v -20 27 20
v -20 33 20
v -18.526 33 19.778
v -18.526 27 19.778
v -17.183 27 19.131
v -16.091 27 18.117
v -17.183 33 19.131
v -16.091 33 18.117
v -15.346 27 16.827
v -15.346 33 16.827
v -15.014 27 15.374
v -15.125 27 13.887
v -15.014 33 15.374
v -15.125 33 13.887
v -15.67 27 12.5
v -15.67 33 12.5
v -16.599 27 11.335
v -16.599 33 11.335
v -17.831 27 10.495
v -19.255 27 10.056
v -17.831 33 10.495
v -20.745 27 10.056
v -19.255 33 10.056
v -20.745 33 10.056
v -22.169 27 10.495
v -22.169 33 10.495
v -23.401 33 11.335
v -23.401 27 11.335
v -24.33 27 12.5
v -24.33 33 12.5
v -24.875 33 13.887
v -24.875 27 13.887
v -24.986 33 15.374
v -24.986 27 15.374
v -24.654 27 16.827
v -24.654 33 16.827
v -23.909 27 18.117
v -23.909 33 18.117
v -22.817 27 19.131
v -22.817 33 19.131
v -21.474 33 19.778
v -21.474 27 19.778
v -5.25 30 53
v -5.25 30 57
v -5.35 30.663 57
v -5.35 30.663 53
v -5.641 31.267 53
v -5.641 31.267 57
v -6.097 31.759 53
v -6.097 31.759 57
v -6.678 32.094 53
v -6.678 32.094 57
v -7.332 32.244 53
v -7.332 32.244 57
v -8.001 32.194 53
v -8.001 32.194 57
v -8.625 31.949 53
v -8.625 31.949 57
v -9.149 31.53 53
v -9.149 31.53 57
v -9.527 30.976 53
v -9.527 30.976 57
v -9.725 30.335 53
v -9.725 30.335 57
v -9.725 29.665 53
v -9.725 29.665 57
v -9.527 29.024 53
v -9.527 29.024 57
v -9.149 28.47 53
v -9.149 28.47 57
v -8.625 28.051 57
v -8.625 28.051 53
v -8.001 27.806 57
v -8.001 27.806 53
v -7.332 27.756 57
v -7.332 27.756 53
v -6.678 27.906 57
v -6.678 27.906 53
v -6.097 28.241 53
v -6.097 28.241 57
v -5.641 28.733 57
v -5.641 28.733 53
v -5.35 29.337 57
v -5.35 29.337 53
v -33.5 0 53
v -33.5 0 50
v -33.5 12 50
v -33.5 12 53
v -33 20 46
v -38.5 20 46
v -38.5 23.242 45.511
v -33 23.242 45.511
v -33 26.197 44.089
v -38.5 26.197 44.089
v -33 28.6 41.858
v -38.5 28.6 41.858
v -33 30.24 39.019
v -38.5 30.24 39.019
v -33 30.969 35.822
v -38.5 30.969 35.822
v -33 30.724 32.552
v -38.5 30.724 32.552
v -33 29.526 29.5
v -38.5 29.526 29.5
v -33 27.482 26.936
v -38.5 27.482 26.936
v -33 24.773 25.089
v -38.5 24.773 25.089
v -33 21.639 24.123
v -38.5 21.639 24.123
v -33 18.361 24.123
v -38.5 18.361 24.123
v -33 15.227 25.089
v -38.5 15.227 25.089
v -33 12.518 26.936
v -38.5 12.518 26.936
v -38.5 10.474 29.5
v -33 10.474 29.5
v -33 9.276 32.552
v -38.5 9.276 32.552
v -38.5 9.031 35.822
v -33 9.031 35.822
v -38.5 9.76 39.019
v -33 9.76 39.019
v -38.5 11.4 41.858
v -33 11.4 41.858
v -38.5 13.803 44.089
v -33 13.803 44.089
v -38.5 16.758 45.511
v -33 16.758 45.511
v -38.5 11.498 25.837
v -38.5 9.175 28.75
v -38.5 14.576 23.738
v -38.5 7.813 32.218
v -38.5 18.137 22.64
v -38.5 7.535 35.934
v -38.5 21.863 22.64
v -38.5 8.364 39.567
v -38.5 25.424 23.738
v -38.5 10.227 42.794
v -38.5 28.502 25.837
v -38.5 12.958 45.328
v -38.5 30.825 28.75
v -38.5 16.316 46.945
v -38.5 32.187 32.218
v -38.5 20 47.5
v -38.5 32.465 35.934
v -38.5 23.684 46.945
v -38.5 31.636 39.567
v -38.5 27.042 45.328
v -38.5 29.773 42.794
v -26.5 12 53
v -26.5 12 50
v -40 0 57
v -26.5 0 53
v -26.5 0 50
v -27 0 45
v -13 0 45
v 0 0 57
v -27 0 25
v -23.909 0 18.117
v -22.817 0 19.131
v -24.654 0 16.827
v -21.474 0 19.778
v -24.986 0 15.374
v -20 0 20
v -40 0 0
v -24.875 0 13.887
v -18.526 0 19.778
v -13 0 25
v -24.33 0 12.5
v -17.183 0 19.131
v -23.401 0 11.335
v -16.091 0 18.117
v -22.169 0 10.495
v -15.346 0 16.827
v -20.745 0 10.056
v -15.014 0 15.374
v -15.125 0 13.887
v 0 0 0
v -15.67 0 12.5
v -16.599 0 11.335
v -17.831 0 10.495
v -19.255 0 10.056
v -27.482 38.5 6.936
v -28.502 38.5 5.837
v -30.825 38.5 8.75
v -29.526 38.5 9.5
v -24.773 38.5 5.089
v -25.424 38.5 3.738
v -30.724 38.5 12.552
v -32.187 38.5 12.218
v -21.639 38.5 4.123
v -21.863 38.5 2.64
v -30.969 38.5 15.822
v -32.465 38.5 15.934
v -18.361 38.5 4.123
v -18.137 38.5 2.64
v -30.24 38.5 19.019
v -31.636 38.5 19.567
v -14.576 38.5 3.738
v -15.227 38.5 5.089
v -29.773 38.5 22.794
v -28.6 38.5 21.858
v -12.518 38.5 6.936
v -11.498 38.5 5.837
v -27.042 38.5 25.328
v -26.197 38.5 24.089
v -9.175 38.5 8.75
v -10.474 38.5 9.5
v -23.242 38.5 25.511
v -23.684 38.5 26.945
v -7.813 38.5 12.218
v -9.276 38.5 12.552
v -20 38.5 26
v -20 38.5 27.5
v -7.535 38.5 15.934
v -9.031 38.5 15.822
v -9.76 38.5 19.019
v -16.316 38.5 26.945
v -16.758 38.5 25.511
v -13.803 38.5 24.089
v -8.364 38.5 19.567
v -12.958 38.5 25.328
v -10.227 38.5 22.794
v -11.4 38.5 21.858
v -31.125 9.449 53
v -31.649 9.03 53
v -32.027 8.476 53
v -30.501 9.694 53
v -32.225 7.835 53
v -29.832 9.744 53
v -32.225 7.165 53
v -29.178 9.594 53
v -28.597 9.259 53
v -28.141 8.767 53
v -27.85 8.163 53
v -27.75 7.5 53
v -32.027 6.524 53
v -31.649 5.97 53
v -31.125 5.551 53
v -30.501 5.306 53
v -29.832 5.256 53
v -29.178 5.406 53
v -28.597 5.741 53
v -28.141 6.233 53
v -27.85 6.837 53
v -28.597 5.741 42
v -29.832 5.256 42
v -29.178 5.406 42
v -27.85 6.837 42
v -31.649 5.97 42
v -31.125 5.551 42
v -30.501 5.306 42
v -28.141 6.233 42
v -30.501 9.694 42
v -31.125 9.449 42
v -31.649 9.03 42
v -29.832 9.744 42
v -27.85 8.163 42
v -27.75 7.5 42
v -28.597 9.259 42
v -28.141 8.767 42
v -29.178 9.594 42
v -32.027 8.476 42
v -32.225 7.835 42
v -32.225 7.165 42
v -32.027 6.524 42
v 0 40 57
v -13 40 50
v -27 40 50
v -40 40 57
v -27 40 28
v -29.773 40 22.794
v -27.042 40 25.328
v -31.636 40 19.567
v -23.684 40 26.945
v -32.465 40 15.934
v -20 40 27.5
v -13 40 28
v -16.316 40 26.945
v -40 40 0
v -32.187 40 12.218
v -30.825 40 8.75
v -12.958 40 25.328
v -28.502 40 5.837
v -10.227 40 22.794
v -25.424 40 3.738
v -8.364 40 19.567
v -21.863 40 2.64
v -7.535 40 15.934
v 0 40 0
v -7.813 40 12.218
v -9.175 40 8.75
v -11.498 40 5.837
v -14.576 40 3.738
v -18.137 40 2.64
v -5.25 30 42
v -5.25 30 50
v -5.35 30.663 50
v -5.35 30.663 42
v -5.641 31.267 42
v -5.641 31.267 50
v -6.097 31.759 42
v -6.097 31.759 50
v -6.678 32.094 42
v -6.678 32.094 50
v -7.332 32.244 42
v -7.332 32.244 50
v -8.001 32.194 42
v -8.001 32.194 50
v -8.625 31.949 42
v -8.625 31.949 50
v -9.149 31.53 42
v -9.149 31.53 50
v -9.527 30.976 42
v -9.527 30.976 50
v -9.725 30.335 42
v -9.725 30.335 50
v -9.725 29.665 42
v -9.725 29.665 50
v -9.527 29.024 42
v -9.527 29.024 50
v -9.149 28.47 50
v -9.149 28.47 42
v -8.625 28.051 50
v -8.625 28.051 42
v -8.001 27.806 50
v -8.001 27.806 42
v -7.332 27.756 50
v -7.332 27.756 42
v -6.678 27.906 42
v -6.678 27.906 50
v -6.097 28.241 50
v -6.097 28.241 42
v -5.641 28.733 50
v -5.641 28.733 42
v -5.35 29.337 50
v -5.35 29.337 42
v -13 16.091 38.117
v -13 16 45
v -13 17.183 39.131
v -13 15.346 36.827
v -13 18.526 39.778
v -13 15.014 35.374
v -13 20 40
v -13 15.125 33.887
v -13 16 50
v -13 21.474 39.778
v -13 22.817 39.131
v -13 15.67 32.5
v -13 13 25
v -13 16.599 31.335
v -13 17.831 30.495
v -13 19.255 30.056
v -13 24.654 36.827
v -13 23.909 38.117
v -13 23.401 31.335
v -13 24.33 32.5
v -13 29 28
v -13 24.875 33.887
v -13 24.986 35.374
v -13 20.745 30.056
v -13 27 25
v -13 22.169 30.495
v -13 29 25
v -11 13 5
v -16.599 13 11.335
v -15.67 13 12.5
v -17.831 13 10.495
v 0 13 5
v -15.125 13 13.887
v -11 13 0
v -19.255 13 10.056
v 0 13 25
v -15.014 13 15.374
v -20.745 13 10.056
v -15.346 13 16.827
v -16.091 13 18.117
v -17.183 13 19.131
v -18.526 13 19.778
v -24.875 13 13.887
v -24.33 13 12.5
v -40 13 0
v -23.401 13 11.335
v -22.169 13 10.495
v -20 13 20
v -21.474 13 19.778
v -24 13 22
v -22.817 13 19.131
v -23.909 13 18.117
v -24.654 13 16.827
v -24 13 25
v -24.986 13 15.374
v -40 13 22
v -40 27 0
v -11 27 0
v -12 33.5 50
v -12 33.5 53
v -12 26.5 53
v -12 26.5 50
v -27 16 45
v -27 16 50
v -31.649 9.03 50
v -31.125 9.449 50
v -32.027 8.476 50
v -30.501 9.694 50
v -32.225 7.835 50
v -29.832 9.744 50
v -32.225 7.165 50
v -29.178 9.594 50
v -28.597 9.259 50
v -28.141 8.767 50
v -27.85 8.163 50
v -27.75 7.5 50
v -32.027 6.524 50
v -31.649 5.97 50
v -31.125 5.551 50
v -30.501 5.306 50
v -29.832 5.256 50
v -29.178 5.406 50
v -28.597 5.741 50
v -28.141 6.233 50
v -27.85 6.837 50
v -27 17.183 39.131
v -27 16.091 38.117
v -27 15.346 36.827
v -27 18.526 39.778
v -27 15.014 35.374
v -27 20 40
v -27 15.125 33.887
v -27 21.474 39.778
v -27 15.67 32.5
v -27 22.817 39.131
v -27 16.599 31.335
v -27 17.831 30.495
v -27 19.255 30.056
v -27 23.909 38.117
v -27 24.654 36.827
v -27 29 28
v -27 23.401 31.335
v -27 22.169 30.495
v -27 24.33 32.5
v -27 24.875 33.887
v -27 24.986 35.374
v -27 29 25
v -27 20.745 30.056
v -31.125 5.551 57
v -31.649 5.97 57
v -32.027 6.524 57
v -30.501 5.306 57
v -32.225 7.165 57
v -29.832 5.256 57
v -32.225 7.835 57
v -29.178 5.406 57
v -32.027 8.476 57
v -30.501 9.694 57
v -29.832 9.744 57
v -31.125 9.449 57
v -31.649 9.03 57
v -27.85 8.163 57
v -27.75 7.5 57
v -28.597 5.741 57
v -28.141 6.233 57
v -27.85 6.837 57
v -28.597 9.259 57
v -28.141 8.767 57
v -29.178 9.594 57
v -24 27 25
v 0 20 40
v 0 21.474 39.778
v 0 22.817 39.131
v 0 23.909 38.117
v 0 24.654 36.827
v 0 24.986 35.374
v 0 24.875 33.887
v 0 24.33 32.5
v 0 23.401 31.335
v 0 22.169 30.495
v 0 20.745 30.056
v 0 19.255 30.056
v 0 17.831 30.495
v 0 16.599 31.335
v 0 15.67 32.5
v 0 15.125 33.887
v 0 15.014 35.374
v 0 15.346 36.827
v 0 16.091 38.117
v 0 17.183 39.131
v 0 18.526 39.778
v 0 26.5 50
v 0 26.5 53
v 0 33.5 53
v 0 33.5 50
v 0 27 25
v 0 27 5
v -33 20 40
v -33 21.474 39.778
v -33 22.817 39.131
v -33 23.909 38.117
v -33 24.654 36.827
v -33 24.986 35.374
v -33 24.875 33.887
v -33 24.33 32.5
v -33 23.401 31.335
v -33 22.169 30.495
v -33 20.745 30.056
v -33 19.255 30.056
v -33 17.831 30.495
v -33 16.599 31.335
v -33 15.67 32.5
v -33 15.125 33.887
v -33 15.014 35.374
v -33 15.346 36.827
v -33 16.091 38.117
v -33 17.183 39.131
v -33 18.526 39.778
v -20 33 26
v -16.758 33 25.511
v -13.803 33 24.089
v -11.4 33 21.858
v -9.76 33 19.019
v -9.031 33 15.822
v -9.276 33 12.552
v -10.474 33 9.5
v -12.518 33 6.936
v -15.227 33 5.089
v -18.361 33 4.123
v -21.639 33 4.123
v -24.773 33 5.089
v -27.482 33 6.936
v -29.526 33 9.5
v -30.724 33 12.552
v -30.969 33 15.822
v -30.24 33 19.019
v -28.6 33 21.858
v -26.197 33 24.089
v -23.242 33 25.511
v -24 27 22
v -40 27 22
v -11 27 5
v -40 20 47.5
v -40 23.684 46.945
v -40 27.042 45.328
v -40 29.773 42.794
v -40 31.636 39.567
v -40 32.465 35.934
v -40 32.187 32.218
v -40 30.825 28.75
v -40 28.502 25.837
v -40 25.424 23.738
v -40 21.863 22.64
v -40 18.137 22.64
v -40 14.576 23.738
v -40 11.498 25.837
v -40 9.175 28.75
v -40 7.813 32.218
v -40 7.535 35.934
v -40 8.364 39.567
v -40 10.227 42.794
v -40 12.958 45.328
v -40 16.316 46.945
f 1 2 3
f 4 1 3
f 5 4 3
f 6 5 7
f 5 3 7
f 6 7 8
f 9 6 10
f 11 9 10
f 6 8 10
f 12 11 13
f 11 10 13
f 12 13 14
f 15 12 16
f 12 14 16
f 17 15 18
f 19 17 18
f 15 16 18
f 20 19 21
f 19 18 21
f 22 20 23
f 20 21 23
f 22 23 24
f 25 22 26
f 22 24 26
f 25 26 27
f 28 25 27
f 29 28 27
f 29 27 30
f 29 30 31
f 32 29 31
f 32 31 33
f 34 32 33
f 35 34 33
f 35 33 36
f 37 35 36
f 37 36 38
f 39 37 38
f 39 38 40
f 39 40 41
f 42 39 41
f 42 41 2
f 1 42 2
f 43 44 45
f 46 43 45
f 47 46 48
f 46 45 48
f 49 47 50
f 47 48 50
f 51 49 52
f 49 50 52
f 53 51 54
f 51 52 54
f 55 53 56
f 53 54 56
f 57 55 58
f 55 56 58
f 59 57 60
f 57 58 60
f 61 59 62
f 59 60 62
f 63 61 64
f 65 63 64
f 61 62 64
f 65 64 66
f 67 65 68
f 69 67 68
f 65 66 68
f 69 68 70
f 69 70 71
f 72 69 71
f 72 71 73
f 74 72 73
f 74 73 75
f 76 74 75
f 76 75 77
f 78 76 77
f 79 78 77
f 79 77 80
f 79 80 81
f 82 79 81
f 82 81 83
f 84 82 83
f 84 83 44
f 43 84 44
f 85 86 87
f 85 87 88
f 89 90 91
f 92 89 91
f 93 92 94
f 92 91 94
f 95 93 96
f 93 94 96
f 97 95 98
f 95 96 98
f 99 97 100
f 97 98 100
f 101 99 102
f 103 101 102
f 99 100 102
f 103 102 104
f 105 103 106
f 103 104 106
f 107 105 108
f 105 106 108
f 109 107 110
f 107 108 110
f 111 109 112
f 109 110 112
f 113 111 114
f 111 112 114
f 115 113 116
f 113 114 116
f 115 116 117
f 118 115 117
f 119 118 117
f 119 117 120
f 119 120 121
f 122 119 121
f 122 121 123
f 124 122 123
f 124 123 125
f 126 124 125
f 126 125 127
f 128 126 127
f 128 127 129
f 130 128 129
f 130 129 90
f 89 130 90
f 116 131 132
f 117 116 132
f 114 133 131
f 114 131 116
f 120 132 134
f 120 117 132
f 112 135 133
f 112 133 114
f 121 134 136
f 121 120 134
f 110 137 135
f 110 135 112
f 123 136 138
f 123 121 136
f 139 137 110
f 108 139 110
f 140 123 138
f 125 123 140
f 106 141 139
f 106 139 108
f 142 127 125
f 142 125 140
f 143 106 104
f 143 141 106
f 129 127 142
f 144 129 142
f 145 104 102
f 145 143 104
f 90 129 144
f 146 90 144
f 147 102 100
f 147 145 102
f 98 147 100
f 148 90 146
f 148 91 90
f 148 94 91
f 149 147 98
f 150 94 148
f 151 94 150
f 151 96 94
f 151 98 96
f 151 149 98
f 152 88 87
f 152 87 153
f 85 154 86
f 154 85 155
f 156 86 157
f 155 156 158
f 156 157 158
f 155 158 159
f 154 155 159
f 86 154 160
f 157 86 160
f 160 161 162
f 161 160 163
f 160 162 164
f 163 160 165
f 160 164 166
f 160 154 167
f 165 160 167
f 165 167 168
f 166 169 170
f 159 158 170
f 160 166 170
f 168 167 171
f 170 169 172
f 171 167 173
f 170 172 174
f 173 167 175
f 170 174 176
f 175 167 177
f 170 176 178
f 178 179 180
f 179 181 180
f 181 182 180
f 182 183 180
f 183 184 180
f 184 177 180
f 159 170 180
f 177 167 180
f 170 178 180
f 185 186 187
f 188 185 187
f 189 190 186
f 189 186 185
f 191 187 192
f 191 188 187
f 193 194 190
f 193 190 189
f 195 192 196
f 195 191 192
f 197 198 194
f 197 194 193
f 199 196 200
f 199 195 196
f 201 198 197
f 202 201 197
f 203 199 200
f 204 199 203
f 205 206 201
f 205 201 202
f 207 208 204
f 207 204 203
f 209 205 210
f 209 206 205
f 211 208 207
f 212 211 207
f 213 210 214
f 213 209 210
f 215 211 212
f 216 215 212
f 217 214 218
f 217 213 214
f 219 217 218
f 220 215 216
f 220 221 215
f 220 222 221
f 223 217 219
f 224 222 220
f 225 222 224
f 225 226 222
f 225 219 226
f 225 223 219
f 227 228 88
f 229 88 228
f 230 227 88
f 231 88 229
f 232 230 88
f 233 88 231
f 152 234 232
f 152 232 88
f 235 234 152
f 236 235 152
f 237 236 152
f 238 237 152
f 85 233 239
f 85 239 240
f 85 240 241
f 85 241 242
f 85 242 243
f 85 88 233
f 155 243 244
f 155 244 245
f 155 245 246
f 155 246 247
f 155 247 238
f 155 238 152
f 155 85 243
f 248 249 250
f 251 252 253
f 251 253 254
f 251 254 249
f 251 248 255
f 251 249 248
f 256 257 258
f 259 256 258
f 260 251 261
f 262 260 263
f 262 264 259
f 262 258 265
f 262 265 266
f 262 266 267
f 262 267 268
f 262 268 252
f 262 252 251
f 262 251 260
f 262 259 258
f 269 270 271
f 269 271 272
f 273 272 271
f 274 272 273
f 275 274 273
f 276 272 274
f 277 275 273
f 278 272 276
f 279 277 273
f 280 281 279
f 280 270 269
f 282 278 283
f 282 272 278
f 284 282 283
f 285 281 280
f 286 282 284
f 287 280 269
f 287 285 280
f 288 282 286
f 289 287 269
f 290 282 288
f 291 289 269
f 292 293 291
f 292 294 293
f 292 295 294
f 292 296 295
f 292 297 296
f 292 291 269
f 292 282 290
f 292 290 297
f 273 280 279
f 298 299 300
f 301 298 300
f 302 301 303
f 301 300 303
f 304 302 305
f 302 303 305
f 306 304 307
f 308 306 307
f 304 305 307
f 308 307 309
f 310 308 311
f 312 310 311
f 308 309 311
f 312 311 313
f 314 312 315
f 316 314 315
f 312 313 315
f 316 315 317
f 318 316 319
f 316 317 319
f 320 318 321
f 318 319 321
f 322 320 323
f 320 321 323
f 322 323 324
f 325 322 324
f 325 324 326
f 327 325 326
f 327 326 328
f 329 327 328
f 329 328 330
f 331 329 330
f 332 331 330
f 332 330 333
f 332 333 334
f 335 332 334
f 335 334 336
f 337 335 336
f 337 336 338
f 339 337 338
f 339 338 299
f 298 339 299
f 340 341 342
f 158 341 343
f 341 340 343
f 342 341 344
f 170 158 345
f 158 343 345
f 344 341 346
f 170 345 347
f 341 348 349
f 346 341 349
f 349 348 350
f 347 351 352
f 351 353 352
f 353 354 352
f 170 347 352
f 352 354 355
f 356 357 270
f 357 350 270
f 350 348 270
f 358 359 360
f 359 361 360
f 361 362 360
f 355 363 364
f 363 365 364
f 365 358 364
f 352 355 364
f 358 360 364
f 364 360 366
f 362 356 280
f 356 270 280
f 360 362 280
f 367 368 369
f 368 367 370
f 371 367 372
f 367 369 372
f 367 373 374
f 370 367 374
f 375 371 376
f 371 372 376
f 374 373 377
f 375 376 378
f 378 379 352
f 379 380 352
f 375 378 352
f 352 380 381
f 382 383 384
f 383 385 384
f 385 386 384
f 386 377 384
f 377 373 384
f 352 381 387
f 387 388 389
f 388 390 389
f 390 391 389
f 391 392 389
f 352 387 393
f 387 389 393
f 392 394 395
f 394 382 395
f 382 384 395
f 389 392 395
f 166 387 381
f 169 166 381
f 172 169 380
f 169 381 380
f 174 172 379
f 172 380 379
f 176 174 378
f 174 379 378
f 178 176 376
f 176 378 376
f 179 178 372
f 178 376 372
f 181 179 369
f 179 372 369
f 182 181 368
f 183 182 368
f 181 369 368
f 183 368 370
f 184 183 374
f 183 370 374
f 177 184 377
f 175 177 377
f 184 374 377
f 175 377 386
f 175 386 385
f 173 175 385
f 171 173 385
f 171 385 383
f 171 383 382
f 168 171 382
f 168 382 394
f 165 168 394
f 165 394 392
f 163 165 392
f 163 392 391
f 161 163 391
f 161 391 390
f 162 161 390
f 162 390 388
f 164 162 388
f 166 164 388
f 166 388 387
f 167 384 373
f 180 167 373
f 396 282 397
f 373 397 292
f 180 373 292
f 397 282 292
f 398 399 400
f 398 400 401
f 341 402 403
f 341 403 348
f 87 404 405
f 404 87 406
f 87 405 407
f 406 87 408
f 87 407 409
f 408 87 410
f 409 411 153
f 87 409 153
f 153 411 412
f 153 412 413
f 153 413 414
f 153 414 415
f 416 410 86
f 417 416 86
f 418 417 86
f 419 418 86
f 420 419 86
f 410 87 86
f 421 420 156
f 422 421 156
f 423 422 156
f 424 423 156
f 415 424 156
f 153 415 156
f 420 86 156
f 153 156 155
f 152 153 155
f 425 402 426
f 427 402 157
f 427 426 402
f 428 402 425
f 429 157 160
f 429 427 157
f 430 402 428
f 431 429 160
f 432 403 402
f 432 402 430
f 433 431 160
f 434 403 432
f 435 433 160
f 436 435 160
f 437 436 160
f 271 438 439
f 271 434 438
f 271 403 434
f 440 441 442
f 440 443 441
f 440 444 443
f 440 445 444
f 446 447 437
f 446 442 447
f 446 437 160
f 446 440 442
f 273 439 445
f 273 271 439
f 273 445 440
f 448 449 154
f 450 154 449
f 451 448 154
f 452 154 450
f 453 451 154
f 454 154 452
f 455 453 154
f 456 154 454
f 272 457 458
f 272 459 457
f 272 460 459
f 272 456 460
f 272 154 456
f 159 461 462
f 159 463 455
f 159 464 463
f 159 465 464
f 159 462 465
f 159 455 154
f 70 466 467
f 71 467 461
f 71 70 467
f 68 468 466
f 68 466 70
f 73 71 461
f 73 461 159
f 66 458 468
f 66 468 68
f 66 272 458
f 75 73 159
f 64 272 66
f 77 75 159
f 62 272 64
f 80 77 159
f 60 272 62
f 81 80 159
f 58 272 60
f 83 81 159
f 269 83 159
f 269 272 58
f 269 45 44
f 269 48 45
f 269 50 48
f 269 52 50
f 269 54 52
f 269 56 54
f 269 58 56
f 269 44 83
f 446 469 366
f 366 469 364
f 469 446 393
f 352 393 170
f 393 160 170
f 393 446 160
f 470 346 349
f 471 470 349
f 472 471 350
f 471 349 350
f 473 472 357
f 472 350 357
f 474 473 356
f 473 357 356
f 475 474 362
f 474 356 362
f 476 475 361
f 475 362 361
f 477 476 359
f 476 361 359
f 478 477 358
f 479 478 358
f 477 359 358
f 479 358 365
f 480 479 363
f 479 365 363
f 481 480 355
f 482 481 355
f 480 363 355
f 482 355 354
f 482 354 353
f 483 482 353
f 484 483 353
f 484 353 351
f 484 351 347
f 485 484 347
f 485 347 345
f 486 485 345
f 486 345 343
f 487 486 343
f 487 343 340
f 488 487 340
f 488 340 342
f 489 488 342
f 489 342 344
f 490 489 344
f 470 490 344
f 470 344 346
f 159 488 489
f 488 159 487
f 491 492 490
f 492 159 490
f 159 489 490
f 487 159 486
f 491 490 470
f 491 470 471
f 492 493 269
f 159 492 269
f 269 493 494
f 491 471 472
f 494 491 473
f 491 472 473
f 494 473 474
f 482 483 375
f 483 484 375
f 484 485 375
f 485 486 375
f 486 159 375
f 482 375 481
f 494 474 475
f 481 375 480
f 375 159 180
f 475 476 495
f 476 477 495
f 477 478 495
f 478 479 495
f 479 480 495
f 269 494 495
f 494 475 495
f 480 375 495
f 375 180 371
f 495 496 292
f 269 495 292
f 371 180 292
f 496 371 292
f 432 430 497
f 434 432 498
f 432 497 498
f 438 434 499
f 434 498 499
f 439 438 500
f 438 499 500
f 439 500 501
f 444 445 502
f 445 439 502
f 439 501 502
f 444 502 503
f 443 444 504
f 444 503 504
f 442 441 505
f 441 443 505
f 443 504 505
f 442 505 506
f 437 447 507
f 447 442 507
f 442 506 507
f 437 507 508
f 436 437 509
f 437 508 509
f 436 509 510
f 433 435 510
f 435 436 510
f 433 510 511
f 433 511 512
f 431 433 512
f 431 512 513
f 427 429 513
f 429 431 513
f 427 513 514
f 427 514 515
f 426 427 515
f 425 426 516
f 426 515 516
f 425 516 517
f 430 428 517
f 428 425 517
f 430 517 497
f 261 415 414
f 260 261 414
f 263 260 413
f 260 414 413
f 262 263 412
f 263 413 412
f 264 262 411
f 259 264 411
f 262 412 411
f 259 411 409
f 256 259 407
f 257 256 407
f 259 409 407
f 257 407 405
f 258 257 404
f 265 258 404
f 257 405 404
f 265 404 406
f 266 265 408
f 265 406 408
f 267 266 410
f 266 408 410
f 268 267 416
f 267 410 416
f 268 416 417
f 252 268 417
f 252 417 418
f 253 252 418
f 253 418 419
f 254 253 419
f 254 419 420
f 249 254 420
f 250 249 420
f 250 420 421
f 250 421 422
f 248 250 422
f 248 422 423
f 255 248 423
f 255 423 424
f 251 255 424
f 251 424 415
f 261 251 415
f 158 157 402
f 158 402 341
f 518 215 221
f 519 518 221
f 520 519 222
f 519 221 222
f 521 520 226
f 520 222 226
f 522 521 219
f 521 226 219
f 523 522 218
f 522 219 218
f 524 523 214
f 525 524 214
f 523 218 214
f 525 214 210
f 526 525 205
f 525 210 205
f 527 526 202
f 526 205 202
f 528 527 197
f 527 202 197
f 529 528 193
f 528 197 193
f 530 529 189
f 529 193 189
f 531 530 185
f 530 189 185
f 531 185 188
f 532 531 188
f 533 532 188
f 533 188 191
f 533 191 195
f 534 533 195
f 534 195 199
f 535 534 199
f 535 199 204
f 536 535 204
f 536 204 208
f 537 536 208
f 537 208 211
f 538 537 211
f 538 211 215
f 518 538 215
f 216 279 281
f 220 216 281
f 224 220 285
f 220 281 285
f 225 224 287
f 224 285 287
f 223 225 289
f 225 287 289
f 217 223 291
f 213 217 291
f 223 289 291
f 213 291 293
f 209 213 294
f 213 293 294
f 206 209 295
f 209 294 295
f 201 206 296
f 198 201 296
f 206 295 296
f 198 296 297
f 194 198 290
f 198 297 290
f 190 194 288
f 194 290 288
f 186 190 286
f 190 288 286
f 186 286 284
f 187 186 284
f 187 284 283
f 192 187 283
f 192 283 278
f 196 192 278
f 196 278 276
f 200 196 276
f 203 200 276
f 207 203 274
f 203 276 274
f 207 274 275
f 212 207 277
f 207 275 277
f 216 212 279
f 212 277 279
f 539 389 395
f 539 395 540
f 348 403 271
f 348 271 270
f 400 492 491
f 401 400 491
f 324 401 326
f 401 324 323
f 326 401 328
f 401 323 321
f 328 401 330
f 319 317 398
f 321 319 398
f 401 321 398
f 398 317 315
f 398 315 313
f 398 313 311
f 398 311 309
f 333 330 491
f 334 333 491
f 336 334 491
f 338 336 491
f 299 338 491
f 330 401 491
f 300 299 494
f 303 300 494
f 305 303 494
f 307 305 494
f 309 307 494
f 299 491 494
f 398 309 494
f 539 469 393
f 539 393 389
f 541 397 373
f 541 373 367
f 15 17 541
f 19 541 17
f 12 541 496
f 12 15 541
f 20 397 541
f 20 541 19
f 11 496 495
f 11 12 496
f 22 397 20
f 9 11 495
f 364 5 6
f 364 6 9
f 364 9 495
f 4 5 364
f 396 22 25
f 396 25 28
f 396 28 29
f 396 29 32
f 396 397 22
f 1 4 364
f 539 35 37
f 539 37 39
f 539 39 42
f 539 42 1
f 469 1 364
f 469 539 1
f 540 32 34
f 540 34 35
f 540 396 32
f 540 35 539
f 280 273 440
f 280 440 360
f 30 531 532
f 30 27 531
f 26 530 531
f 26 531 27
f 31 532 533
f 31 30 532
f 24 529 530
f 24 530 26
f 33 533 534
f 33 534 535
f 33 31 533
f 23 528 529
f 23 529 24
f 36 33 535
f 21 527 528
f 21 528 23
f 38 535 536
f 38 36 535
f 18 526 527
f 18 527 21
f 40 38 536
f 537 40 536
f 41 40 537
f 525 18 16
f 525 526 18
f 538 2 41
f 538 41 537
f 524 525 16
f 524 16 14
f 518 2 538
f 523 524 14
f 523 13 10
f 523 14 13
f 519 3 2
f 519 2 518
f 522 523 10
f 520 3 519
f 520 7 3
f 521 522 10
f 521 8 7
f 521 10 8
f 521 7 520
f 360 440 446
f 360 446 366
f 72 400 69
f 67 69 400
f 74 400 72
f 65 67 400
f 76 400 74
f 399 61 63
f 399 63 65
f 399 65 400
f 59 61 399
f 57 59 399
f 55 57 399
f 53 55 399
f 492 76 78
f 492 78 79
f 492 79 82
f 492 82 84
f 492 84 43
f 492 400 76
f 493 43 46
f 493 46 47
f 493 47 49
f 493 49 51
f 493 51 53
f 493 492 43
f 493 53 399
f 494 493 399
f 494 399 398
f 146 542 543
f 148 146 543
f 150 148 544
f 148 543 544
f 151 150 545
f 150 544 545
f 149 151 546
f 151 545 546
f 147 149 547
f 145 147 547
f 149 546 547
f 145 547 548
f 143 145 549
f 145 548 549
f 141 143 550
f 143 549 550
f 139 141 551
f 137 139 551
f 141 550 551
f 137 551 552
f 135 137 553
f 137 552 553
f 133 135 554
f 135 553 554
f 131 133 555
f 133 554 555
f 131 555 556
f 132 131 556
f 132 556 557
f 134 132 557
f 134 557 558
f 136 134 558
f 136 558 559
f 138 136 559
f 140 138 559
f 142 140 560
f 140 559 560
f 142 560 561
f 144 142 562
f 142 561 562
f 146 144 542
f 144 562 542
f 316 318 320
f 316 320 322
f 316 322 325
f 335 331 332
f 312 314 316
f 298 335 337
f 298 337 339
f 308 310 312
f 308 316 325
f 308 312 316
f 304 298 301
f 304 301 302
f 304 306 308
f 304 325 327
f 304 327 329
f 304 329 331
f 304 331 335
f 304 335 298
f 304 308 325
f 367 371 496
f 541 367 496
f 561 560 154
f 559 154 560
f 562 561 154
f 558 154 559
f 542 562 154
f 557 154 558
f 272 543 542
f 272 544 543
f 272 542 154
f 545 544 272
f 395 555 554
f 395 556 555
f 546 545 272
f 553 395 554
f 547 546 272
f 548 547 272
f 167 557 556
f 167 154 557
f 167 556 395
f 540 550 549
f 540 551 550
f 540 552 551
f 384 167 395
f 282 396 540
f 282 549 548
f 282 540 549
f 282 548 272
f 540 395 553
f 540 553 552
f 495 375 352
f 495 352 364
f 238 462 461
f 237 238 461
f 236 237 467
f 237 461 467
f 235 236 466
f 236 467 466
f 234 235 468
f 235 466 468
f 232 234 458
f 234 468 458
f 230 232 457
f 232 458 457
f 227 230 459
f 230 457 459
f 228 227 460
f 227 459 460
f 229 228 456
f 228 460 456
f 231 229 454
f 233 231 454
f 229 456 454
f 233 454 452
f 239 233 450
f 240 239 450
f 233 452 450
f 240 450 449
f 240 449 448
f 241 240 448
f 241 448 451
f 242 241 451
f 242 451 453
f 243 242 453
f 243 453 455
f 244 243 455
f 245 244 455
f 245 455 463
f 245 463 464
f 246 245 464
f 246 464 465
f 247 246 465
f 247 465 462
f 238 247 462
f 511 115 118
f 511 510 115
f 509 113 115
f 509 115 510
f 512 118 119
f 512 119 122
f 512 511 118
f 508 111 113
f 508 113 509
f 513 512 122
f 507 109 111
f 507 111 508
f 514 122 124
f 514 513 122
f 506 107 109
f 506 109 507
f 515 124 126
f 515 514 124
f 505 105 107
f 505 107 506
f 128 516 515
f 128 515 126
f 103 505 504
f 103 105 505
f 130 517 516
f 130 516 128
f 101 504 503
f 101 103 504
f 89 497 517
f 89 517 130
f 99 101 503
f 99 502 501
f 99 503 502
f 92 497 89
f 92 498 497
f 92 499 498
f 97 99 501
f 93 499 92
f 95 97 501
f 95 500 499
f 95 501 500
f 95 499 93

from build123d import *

# Parameters (mm, degrees)
ESQUISSE1_W              = 40
ESQUISSE1_H              = 40
BOSS_EXTRU_1_DEPTH       = 50
ESQUISSE2_R              = 5
ENL_V_MAT_EXTRU_1_DEPTH  = 41
ESQUISSE3_R              = 5
ENL_V_MAT_EXTRU_2_DEPTH  = 41
ESQUISSE4_W              = 22
ESQUISSE4_H              = 14
ENL_V_MAT_EXTRU_3_DEPTH  = 29
ESQUISSE5_W              = 14
ESQUISSE5_H              = 20
ENL_V_MAT_EXTRU_4_DEPTH  = 29
ESQUISSE6_W              = 20
ESQUISSE6_H              = 14
ENL_V_MAT_EXTRU_5_DEPTH  = 24
ESQUISSE7_W              = 14
ESQUISSE7_H              = 22
ENL_V_MAT_EXTRU_6_DEPTH  = 24
ESQUISSE10_R             = 11
ENL_V_MAT_EXTRU_9_DEPTH  = 7
ESQUISSE11_R             = 12.5
ENL_V_MAT_EXTRU_10_DEPTH = 1.5
ESQUISSE14_R             = 11
ENL_V_MAT_EXTRU_11_DEPTH = 7
ESQUISSE15_R             = 12.5
ENL_V_MAT_EXTRU_12_DEPTH = 1.5
ESQUISSE16_W             = 40
ESQUISSE16_H             = 40
BOSS_EXTRU_2_DEPTH       = 7
ESQUISSE17_R             = 2.25
ENL_V_MAT_EXTRU_13_DEPTH = 15
ESQUISSE18_W             = 7
ESQUISSE18_H             = 3
ENL_V_MAT_EXTRU_14_DEPTH = 12
ESQUISSE19_W             = 3
ESQUISSE19_H             = 7
ENL_V_MAT_EXTRU_15_DEPTH = 12


with BuildPart() as part:
    # Esquisse1 → Boss.-Extru.1 (new body)
    with BuildSketch(Plane.XY):
        with Locations((-20, 20)):
            Rectangle(ESQUISSE1_W, ESQUISSE1_H)
    extrude(amount=BOSS_EXTRU_1_DEPTH)

    # Esquisse2 → Enlèv. mat.-Extru.1 (cut, through all)
    with BuildSketch(Plane(origin=(0, 40, 0), x_dir=(1, 0, 0), z_dir=(0, 1, 0))):
        with Locations(Location((-20, -15, 0), (0, 0, 270))):  # turned: the seam where the file's is
            Circle(ESQUISSE2_R)
    extrude(amount=-ENL_V_MAT_EXTRU_1_DEPTH, mode=Mode.SUBTRACT)

    # Esquisse3 → Enlèv. mat.-Extru.2 (cut, through all)
    with BuildSketch(Plane.ZY.offset(40)):
        with Locations((35, 20)):
            Circle(ESQUISSE3_R)
    extrude(amount=-ENL_V_MAT_EXTRU_2_DEPTH, mode=Mode.SUBTRACT)

    # Esquisse4 → Enlèv. mat.-Extru.3 (cut)
    with BuildSketch(Plane.ZY.offset(40)):
        with Locations((11, 20)):
            Rectangle(ESQUISSE4_W, ESQUISSE4_H)
    extrude(amount=-ENL_V_MAT_EXTRU_3_DEPTH, mode=Mode.SUBTRACT)

    # Esquisse5 → Enlèv. mat.-Extru.4 (cut)
    with BuildSketch(Plane.XZ):
        with Locations((-20, 35)):
            Rectangle(ESQUISSE5_W, ESQUISSE5_H)
    extrude(amount=-ENL_V_MAT_EXTRU_4_DEPTH, mode=Mode.SUBTRACT)

    # Esquisse6 → Enlèv. mat.-Extru.5 (cut)
    with BuildSketch(Plane(origin=(0, 0, 0), x_dir=(0, 0, -1), z_dir=(1, 0, 0))):
        with Locations((-15, 20)):
            Rectangle(ESQUISSE6_W, ESQUISSE6_H)
    extrude(amount=-ENL_V_MAT_EXTRU_5_DEPTH, mode=Mode.SUBTRACT)

    # Esquisse7 → Enlèv. mat.-Extru.6 (cut)
    with BuildSketch(Plane(origin=(0, 40, 0), x_dir=(1, 0, 0), z_dir=(0, 1, 0))):
        with Locations((-20, -39)):
            Rectangle(ESQUISSE7_W, ESQUISSE7_H)
    extrude(amount=-ENL_V_MAT_EXTRU_6_DEPTH, mode=Mode.SUBTRACT)

    # Esquisse10 → Enlèv. mat.-Extru.9 (cut)
    with BuildSketch(Plane(origin=(0, 40, 0), x_dir=(1, 0, 0), z_dir=(0, 1, 0))):
        with Locations(Location((-20, -15, 0), (0, 0, 270))):  # turned: the seam where the file's is
            Circle(ESQUISSE10_R)
    extrude(amount=-ENL_V_MAT_EXTRU_9_DEPTH, mode=Mode.SUBTRACT)

    # Esquisse11 → Enlèv. mat.-Extru.10 (cut)
    with BuildSketch(Plane(origin=(0, 40, 0), x_dir=(1, 0, 0), z_dir=(0, 1, 0))):
        with Locations(Location((-20, -15, 0), (0, 0, 270))):  # turned: the seam where the file's is
            Circle(ESQUISSE11_R)
    extrude(amount=-ENL_V_MAT_EXTRU_10_DEPTH, mode=Mode.SUBTRACT)

    # Esquisse14 → Enlèv. mat.-Extru.11 (cut)
    with BuildSketch(Plane.ZY.offset(40)):
        with Locations((35, 20)):
            Circle(ESQUISSE14_R)
    extrude(amount=-ENL_V_MAT_EXTRU_11_DEPTH, mode=Mode.SUBTRACT)

    # Esquisse15 → Enlèv. mat.-Extru.12 (cut)
    with BuildSketch(Plane.ZY.offset(40)):
        with Locations((35, 20)):
            Circle(ESQUISSE15_R)
    extrude(amount=-ENL_V_MAT_EXTRU_12_DEPTH, mode=Mode.SUBTRACT)

    # Esquisse16 → Boss.-Extru.2 (add)
    with BuildSketch(Plane.XY.offset(50)):
        with Locations((-20, 20)):
            Rectangle(ESQUISSE16_W, ESQUISSE16_H)
    extrude(amount=BOSS_EXTRU_2_DEPTH)

    # Esquisse17 → Enlèv. mat.-Extru.13 (cut)
    with BuildSketch(Plane.XY.offset(57)):
        with Locations((-30, 7.5)):
            Circle(ESQUISSE17_R)
        with Locations((-7.5, 30)):
            Circle(ESQUISSE17_R)
    extrude(amount=-ENL_V_MAT_EXTRU_13_DEPTH, mode=Mode.SUBTRACT)

    # Esquisse18 → Enlèv. mat.-Extru.14 (cut)
    with BuildSketch(Plane.XZ):
        with Locations((-30, 51.5)):
            Rectangle(ESQUISSE18_W, ESQUISSE18_H)
    extrude(amount=-ENL_V_MAT_EXTRU_14_DEPTH, mode=Mode.SUBTRACT)

    # Esquisse19 → Enlèv. mat.-Extru.15 (cut)
    with BuildSketch(Plane(origin=(0, 0, 0), x_dir=(0, 0, -1), z_dir=(1, 0, 0))):
        with Locations((-51.5, 30)):
            Rectangle(ESQUISSE19_W, ESQUISSE19_H)
    extrude(amount=-ENL_V_MAT_EXTRU_15_DEPTH, mode=Mode.SUBTRACT)


solid = part.part
